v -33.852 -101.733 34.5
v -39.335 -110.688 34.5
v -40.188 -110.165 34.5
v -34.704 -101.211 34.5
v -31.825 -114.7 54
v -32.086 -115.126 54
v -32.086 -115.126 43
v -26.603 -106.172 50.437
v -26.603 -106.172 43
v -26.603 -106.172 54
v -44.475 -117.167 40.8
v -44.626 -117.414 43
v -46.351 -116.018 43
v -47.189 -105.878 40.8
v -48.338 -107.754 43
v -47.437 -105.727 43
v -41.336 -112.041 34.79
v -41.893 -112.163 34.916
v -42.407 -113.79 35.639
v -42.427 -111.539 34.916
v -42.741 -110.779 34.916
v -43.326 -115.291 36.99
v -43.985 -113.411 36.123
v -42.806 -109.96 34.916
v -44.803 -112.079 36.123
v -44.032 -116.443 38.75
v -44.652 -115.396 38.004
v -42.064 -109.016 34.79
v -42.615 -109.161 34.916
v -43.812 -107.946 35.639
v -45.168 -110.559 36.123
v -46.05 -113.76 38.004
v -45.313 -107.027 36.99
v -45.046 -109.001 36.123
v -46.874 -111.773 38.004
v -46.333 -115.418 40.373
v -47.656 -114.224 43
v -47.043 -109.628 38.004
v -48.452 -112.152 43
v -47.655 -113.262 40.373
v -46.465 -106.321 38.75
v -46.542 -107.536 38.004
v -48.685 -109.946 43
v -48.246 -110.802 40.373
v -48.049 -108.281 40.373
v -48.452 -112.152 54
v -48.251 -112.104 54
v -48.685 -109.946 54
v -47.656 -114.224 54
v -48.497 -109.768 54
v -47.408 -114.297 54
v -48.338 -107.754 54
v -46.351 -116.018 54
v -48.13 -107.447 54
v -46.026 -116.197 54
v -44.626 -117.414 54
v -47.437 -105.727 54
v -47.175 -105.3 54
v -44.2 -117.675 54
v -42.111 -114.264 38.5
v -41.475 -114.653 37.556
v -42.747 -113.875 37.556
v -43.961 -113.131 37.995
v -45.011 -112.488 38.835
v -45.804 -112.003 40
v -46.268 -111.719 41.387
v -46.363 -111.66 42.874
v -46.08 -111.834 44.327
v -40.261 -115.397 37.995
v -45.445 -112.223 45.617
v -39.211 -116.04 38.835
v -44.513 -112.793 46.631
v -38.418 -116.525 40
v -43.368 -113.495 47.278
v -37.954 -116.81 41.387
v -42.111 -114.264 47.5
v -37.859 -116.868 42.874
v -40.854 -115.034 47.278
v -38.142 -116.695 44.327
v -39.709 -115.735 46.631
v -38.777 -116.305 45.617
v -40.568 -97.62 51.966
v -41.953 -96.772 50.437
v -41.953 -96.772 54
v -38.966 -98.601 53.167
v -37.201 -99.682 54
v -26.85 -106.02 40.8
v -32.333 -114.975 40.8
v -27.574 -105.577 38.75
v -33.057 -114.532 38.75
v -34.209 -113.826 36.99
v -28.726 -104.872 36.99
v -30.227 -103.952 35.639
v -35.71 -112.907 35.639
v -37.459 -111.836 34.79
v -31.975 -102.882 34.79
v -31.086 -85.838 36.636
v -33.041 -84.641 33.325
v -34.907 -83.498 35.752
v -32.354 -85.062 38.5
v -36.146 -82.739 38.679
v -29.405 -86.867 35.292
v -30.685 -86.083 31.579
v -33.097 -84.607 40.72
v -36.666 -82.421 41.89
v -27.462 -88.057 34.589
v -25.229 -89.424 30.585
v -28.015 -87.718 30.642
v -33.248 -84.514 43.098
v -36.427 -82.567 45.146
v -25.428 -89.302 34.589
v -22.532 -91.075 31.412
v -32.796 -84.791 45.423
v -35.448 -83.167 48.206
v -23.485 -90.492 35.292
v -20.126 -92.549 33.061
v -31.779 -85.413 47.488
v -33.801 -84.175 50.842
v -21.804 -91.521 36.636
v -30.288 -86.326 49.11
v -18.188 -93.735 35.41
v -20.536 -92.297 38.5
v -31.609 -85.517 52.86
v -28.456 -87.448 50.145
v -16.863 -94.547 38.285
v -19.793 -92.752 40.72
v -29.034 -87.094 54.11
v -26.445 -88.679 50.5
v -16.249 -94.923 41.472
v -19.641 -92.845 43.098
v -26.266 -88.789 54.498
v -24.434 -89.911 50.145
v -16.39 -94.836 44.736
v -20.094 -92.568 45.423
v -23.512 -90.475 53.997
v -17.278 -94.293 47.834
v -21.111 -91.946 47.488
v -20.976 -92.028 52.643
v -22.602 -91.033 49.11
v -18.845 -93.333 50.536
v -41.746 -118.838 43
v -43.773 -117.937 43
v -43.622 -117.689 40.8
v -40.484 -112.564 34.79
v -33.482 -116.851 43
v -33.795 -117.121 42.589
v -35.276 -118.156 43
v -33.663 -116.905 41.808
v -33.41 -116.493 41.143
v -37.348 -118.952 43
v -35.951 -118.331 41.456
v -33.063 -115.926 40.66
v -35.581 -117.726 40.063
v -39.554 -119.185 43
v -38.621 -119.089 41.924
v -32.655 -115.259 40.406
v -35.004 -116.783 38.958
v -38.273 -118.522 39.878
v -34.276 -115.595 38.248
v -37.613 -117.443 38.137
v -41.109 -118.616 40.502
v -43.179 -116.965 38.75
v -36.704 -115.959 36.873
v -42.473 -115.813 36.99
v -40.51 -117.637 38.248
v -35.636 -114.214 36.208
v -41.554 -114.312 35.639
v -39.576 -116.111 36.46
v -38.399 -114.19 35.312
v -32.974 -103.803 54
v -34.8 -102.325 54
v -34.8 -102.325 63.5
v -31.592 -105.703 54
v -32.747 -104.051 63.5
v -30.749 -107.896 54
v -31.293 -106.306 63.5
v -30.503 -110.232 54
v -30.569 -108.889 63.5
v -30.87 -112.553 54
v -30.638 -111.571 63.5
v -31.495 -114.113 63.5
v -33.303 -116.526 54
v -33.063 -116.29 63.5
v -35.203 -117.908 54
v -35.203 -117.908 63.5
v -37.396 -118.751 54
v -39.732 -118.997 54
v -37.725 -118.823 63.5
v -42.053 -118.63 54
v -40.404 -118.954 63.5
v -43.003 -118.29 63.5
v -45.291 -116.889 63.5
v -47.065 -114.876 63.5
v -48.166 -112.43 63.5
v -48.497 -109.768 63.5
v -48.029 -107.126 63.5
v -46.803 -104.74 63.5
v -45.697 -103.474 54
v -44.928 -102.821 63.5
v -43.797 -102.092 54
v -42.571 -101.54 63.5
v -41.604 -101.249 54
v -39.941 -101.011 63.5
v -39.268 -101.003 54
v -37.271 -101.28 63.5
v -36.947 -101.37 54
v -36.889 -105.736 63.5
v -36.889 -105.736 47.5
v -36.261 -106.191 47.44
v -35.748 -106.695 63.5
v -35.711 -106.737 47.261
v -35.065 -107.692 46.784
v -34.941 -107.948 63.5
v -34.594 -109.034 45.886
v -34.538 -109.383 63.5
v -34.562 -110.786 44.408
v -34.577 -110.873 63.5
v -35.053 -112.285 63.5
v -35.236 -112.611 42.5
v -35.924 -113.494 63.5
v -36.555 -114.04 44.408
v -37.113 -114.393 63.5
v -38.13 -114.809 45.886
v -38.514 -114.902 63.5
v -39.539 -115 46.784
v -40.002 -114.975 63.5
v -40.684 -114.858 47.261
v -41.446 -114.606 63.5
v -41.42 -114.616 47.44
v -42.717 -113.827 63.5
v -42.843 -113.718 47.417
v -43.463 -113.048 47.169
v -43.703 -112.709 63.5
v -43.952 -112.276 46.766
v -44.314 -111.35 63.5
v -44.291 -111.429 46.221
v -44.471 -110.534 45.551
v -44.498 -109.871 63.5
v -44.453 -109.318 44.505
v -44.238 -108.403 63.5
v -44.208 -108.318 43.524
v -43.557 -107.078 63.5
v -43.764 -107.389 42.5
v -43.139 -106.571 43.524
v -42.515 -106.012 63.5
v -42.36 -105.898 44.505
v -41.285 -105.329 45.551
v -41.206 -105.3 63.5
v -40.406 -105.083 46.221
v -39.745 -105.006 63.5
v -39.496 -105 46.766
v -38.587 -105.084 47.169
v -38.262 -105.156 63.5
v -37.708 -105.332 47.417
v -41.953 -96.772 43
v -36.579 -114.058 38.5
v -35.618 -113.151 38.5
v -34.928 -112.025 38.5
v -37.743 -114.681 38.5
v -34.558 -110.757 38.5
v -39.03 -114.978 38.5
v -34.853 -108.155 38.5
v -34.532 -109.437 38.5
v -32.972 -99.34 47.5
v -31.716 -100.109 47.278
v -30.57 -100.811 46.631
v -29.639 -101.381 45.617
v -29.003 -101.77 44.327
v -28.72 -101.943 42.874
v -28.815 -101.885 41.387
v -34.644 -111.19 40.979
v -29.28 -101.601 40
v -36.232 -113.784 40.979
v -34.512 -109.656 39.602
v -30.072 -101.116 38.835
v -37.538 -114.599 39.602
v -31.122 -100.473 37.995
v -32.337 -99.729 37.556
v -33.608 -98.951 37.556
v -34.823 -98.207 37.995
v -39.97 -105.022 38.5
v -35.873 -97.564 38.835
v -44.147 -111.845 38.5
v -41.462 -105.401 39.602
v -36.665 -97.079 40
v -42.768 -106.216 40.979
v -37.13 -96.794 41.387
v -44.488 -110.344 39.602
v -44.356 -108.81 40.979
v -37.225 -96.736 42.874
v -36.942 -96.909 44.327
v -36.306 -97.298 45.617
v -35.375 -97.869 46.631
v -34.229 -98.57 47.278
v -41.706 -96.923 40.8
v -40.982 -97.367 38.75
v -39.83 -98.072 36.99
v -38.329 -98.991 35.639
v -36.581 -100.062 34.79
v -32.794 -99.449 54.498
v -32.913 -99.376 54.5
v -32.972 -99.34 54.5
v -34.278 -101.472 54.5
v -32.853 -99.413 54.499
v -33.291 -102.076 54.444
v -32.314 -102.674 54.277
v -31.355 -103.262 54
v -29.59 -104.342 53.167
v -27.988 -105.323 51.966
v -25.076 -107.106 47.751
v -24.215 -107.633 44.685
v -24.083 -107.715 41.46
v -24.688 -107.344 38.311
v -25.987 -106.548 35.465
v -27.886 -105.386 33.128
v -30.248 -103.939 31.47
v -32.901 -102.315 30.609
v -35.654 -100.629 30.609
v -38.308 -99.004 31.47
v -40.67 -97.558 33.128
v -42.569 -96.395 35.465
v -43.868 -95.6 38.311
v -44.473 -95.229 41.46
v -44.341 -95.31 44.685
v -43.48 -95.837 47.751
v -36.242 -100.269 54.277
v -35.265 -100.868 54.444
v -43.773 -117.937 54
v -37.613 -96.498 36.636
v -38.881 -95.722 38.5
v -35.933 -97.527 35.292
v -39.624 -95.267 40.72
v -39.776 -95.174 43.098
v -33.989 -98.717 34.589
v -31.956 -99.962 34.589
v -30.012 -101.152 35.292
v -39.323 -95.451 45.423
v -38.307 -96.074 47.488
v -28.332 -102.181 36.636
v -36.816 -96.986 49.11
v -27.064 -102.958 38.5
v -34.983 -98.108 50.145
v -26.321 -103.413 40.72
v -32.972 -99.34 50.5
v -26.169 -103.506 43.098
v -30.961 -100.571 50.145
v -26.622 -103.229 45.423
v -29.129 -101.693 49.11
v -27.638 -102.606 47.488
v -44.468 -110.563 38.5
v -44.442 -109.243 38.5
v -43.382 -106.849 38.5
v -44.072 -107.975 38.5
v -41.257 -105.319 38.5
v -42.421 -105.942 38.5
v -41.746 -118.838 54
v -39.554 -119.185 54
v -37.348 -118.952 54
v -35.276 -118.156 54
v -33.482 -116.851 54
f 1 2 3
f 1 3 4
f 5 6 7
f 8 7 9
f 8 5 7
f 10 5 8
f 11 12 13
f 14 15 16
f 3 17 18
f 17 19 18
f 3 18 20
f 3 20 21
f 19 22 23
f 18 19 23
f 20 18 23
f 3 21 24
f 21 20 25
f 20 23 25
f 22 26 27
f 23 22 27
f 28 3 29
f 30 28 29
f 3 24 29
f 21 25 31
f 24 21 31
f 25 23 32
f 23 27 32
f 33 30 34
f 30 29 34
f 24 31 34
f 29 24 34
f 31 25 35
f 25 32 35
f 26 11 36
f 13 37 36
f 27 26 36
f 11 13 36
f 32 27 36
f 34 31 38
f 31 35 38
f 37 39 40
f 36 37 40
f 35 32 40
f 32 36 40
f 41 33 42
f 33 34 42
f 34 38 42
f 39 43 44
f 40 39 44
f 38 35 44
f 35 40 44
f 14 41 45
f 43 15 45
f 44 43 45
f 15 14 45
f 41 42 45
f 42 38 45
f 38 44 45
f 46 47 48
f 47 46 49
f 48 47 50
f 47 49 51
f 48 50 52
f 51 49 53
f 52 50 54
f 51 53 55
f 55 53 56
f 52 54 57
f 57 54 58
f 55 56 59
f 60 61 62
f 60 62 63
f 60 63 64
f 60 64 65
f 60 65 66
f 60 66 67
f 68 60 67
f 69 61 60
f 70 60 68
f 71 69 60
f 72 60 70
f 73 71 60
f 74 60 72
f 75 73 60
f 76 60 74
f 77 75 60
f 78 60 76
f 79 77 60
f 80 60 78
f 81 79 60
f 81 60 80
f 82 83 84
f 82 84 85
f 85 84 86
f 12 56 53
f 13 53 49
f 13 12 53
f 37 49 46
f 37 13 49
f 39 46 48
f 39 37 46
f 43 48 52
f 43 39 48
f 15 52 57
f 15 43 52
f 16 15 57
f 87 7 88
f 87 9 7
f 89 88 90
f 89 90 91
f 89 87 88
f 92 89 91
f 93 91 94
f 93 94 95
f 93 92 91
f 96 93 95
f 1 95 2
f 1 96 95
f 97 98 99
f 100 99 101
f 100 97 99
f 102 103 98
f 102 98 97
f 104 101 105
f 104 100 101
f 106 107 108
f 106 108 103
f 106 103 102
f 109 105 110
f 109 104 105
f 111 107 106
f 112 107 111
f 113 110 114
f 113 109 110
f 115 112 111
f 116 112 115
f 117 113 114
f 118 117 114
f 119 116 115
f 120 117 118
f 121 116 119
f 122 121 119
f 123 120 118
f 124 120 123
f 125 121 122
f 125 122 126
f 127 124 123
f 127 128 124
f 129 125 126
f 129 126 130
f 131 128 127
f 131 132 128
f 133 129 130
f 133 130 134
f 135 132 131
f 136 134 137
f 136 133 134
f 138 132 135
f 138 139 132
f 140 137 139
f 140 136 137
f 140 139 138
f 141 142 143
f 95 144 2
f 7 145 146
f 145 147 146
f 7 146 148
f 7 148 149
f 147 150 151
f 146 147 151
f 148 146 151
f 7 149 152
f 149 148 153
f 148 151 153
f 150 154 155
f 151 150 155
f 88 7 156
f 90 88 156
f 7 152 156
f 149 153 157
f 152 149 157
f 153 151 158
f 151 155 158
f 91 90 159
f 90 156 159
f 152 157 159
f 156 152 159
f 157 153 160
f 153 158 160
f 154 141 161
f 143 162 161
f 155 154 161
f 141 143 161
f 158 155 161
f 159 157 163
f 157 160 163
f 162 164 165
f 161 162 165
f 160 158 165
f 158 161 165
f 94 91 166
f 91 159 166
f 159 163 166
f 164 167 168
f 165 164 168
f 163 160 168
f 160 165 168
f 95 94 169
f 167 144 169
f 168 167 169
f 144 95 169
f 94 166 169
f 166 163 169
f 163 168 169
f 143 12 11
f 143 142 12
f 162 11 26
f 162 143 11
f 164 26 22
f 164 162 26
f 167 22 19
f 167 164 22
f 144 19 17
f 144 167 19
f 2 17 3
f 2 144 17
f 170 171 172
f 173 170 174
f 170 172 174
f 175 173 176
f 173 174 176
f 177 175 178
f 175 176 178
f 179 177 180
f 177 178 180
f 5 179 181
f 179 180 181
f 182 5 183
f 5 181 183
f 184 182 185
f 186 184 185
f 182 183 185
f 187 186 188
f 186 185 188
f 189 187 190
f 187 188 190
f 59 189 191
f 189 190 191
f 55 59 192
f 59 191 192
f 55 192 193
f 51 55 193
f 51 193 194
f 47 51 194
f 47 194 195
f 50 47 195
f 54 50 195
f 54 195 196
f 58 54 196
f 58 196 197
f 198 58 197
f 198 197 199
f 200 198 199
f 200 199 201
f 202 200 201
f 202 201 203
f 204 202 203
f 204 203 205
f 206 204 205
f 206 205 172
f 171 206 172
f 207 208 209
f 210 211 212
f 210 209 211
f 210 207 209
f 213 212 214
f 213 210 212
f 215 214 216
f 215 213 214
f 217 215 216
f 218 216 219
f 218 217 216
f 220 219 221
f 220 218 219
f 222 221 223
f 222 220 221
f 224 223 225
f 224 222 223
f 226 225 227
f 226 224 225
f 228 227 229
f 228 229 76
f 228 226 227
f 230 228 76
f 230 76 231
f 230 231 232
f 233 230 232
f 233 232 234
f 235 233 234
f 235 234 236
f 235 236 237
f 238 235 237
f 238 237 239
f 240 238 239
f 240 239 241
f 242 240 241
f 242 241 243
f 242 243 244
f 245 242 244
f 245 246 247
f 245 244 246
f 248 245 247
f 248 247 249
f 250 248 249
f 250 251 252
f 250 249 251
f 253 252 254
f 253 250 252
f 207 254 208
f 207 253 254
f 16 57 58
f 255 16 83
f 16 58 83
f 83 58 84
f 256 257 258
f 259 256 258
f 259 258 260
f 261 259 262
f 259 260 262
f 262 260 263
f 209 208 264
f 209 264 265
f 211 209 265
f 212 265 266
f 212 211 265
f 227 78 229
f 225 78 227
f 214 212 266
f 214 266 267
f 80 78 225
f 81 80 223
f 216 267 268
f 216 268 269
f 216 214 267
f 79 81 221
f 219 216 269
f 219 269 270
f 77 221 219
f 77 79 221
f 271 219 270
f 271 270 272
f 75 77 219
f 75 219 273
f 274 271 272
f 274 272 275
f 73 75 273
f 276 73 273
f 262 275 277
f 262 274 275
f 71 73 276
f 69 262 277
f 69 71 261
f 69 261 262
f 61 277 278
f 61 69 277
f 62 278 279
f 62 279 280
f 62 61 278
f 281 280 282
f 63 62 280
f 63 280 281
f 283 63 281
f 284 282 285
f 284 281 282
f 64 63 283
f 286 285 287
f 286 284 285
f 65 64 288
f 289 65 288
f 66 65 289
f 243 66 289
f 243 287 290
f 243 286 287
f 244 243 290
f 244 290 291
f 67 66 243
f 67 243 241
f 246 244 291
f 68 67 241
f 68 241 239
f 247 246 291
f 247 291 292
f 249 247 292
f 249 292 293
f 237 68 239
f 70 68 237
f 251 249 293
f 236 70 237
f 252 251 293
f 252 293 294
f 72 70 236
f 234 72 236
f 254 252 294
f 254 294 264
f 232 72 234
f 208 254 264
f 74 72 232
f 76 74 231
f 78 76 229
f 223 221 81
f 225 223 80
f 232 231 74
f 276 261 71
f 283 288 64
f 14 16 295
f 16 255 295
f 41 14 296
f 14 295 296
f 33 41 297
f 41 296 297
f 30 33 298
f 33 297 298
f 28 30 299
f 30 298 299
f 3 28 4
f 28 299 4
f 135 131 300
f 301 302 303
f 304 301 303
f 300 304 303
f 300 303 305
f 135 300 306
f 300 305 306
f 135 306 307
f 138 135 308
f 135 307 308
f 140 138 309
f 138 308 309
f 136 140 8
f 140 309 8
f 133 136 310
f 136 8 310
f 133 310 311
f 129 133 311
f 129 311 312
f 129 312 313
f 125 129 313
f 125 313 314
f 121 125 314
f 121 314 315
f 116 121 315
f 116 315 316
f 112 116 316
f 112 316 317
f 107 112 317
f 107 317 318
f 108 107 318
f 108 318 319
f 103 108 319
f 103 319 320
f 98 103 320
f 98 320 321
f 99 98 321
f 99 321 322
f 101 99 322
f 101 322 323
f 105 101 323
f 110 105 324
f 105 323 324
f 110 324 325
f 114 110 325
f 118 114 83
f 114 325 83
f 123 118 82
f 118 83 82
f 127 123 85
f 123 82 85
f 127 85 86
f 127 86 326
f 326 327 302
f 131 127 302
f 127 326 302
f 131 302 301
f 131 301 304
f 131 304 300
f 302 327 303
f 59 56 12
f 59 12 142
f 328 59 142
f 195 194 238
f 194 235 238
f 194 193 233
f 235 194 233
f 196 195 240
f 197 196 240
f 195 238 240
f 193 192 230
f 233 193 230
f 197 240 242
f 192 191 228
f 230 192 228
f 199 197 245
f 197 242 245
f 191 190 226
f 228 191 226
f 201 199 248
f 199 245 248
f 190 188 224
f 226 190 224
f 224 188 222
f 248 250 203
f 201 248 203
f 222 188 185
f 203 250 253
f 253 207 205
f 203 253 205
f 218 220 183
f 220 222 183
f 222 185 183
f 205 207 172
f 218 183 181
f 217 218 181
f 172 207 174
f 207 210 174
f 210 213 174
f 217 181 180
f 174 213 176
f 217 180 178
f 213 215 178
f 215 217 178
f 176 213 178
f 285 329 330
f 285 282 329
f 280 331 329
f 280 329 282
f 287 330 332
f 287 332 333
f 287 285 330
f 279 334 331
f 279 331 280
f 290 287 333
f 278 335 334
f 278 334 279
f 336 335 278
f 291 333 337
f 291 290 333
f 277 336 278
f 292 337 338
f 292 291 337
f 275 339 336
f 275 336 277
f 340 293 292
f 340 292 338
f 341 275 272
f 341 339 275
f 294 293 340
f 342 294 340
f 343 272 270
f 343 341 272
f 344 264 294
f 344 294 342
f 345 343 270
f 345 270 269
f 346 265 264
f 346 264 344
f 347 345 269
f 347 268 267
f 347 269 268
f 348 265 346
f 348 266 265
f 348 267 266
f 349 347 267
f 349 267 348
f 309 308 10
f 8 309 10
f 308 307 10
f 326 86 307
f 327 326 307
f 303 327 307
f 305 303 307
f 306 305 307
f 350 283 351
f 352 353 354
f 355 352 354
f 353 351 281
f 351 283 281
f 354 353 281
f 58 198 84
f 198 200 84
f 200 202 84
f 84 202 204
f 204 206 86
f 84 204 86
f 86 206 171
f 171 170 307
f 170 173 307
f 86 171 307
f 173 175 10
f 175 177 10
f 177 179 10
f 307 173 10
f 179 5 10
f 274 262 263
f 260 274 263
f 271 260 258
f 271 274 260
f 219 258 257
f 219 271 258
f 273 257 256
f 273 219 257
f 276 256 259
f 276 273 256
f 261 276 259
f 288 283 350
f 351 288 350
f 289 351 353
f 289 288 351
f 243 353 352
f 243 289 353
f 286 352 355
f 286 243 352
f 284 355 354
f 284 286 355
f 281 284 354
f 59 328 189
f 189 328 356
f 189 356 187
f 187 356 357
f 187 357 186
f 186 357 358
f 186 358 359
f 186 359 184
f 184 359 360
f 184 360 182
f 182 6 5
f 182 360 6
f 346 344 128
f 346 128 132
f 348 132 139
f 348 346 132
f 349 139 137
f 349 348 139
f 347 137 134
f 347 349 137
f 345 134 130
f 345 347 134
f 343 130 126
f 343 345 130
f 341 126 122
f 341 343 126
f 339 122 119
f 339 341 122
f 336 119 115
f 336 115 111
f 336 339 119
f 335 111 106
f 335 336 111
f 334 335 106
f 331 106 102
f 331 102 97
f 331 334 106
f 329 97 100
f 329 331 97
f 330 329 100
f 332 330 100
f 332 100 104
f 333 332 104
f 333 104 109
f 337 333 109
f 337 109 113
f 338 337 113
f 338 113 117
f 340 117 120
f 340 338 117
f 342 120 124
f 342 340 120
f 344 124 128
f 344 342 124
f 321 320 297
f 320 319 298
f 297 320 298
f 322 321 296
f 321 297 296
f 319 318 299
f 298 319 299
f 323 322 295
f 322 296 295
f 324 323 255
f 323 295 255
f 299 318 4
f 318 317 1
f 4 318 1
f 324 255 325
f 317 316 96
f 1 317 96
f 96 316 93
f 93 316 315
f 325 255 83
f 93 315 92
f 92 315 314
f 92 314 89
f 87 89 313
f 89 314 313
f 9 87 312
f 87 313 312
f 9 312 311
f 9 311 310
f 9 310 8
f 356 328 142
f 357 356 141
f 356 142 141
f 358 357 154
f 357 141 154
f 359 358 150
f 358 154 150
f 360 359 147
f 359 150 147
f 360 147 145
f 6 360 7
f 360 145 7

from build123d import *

# Parameters (mm, degrees)
CYLINDER021_R               = 5
CYLINDER021_DEPTH           = 25
CYLINDER022_R               = 5
CYLINDER022_DEPTH           = 15
CYLINDER020_R               = 9
CYLINDER020_DEPTH           = 9.5
BOX007_W                    = 19
BOX007_H                    = 18
BOX007_DEPTH                = 19.5
FILLET_R                    = 8.5
CYLINDER024_R               = 5
CYLINDER024_DEPTH           = 2.5
CYLINDER019_R               = 12
CYLINDER019_DEPTH           = 2.5
CYLINDER027_R               = 8
CYLINDER027_DEPTH           = 12.5
CYLINDER026_R               = 12
CYLINDER026_DEPTH           = 12.5
CYLINDER026_PLACEMENT_ANGLE = 1
FUSION025_PLACEMENT_ANGLE   = 90
FUSION042_ROLL_ANGLE        = 180
FUSION042_PLACEMENT_ANGLE   = 58.52


with BuildPart() as tc_bottom_hole:
    # Cylinder021 → Cylinder021 (new body)
    with BuildSketch(Plane.XY):
        Circle(CYLINDER021_R)
    extrude(amount=CYLINDER021_DEPTH)


with BuildPart() as tc_holes:
    # Cylinder022 → Cylinder022 (new body)
    with BuildSketch(Plane(origin=(-5, 0, 21), x_dir=(0, 0, -1), z_dir=(1, 0, 0))):
        Circle(CYLINDER022_R)
    extrude(amount=CYLINDER022_DEPTH)

    # Fusion016: union TC-Bottom-Hole
    add(tc_bottom_hole.part)


with BuildPart() as tc_bottom:
    # Cylinder020 → Cylinder020 (new body)
    with BuildSketch(Plane.XY):
        Circle(CYLINDER020_R)
    extrude(amount=CYLINDER020_DEPTH)


with BuildPart() as turnablecorner002:
    # Box007 → Box007 (new body)
    with BuildSketch(Plane(origin=(-9, -9, 9.5), x_dir=(1, 0, 0), z_dir=(0, 0, 1))):
        with Locations((9.5, 9)):
            Rectangle(BOX007_W, BOX007_H)
    extrude(amount=BOX007_DEPTH)

    # Fillet
    fillet_edges = [turnablecorner002.edges().sort_by_distance(p)[0] for p in [
        (-9, -9, 19.25),
        (-9, 0, 29),
        (-9, 9, 19.25),
        (0.5, -9, 29),
        (0.5, 9, 29),
    ]]
    fillet(fillet_edges, radius=FILLET_R)

    # Fusion018: union TC-Bottom
    add(tc_bottom.part)

    # Cut013: cut TC-Holes
    add(tc_holes.part, mode=Mode.SUBTRACT)


with BuildPart() as largeplughole:
    # Cylinder024 → Cylinder024 (new body)
    with BuildSketch(Plane.XY):
        Circle(CYLINDER024_R)
    extrude(amount=CYLINDER024_DEPTH)


with BuildPart() as largeplugbase001:
    # Cylinder019 → Cylinder019 (new body)
    with BuildSketch(Plane.XY):
        Circle(CYLINDER019_R)
    extrude(amount=CYLINDER019_DEPTH)

    # Cut008: cut LargePlugHole
    add(largeplughole.part, mode=Mode.SUBTRACT)


with BuildPart() as largeplugwallhole:
    # Cylinder027 → Cylinder027 (new body)
    with BuildSketch(Plane.XY.offset(2.5)):
        Circle(CYLINDER027_R)
    extrude(amount=CYLINDER027_DEPTH)


with BuildPart() as radi_in_adapter:
    # Cylinder026 → Cylinder026 (new body)
    with BuildSketch(Plane.XY):
        Circle(CYLINDER026_R)
    extrude(amount=CYLINDER026_DEPTH)


with BuildPart() as radi_in_adapter_1:
    # Cylinder026 placement: moved
    add(radi_in_adapter.part.moved(Location((0, 0, 2.5))).rotate(Axis((0, 0, 2.5), (0, 0, 1)), CYLINDER026_PLACEMENT_ANGLE))

    # Cut007: cut LargePlugWallHole
    add(largeplugwallhole.part, mode=Mode.SUBTRACT)

    # Fusion025: union LargePlugBase001
    add(largeplugbase001.part)


with BuildPart() as radi_in_adapter_2:
    # Fusion025 placement: moved
    add(radi_in_adapter_1.part.moved(Location((10, 0, 21))).rotate(Axis((10, 0, 21), (0, 1, 0)), FUSION025_PLACEMENT_ANGLE))

    # Fusion042: union TurnableCorner002
    add(turnablecorner002.part)


with BuildPart() as radi_in_adapter_3:
    # Fusion042 roll: moved
    add(radi_in_adapter_2.part.rotate(Axis((0, 0, 0), (1, 0, 0)), FUSION042_ROLL_ANGLE))


with BuildPart() as radi_in_adapter_4:
    # Fusion042 placement: moved
    add(radi_in_adapter_3.part.moved(Location((-39.5, -110, 63.5))).rotate(Axis((-39.5, -110, 63.5), (0, 0, 1)), FUSION042_PLACEMENT_ANGLE))


solid = radi_in_adapter_4.part
